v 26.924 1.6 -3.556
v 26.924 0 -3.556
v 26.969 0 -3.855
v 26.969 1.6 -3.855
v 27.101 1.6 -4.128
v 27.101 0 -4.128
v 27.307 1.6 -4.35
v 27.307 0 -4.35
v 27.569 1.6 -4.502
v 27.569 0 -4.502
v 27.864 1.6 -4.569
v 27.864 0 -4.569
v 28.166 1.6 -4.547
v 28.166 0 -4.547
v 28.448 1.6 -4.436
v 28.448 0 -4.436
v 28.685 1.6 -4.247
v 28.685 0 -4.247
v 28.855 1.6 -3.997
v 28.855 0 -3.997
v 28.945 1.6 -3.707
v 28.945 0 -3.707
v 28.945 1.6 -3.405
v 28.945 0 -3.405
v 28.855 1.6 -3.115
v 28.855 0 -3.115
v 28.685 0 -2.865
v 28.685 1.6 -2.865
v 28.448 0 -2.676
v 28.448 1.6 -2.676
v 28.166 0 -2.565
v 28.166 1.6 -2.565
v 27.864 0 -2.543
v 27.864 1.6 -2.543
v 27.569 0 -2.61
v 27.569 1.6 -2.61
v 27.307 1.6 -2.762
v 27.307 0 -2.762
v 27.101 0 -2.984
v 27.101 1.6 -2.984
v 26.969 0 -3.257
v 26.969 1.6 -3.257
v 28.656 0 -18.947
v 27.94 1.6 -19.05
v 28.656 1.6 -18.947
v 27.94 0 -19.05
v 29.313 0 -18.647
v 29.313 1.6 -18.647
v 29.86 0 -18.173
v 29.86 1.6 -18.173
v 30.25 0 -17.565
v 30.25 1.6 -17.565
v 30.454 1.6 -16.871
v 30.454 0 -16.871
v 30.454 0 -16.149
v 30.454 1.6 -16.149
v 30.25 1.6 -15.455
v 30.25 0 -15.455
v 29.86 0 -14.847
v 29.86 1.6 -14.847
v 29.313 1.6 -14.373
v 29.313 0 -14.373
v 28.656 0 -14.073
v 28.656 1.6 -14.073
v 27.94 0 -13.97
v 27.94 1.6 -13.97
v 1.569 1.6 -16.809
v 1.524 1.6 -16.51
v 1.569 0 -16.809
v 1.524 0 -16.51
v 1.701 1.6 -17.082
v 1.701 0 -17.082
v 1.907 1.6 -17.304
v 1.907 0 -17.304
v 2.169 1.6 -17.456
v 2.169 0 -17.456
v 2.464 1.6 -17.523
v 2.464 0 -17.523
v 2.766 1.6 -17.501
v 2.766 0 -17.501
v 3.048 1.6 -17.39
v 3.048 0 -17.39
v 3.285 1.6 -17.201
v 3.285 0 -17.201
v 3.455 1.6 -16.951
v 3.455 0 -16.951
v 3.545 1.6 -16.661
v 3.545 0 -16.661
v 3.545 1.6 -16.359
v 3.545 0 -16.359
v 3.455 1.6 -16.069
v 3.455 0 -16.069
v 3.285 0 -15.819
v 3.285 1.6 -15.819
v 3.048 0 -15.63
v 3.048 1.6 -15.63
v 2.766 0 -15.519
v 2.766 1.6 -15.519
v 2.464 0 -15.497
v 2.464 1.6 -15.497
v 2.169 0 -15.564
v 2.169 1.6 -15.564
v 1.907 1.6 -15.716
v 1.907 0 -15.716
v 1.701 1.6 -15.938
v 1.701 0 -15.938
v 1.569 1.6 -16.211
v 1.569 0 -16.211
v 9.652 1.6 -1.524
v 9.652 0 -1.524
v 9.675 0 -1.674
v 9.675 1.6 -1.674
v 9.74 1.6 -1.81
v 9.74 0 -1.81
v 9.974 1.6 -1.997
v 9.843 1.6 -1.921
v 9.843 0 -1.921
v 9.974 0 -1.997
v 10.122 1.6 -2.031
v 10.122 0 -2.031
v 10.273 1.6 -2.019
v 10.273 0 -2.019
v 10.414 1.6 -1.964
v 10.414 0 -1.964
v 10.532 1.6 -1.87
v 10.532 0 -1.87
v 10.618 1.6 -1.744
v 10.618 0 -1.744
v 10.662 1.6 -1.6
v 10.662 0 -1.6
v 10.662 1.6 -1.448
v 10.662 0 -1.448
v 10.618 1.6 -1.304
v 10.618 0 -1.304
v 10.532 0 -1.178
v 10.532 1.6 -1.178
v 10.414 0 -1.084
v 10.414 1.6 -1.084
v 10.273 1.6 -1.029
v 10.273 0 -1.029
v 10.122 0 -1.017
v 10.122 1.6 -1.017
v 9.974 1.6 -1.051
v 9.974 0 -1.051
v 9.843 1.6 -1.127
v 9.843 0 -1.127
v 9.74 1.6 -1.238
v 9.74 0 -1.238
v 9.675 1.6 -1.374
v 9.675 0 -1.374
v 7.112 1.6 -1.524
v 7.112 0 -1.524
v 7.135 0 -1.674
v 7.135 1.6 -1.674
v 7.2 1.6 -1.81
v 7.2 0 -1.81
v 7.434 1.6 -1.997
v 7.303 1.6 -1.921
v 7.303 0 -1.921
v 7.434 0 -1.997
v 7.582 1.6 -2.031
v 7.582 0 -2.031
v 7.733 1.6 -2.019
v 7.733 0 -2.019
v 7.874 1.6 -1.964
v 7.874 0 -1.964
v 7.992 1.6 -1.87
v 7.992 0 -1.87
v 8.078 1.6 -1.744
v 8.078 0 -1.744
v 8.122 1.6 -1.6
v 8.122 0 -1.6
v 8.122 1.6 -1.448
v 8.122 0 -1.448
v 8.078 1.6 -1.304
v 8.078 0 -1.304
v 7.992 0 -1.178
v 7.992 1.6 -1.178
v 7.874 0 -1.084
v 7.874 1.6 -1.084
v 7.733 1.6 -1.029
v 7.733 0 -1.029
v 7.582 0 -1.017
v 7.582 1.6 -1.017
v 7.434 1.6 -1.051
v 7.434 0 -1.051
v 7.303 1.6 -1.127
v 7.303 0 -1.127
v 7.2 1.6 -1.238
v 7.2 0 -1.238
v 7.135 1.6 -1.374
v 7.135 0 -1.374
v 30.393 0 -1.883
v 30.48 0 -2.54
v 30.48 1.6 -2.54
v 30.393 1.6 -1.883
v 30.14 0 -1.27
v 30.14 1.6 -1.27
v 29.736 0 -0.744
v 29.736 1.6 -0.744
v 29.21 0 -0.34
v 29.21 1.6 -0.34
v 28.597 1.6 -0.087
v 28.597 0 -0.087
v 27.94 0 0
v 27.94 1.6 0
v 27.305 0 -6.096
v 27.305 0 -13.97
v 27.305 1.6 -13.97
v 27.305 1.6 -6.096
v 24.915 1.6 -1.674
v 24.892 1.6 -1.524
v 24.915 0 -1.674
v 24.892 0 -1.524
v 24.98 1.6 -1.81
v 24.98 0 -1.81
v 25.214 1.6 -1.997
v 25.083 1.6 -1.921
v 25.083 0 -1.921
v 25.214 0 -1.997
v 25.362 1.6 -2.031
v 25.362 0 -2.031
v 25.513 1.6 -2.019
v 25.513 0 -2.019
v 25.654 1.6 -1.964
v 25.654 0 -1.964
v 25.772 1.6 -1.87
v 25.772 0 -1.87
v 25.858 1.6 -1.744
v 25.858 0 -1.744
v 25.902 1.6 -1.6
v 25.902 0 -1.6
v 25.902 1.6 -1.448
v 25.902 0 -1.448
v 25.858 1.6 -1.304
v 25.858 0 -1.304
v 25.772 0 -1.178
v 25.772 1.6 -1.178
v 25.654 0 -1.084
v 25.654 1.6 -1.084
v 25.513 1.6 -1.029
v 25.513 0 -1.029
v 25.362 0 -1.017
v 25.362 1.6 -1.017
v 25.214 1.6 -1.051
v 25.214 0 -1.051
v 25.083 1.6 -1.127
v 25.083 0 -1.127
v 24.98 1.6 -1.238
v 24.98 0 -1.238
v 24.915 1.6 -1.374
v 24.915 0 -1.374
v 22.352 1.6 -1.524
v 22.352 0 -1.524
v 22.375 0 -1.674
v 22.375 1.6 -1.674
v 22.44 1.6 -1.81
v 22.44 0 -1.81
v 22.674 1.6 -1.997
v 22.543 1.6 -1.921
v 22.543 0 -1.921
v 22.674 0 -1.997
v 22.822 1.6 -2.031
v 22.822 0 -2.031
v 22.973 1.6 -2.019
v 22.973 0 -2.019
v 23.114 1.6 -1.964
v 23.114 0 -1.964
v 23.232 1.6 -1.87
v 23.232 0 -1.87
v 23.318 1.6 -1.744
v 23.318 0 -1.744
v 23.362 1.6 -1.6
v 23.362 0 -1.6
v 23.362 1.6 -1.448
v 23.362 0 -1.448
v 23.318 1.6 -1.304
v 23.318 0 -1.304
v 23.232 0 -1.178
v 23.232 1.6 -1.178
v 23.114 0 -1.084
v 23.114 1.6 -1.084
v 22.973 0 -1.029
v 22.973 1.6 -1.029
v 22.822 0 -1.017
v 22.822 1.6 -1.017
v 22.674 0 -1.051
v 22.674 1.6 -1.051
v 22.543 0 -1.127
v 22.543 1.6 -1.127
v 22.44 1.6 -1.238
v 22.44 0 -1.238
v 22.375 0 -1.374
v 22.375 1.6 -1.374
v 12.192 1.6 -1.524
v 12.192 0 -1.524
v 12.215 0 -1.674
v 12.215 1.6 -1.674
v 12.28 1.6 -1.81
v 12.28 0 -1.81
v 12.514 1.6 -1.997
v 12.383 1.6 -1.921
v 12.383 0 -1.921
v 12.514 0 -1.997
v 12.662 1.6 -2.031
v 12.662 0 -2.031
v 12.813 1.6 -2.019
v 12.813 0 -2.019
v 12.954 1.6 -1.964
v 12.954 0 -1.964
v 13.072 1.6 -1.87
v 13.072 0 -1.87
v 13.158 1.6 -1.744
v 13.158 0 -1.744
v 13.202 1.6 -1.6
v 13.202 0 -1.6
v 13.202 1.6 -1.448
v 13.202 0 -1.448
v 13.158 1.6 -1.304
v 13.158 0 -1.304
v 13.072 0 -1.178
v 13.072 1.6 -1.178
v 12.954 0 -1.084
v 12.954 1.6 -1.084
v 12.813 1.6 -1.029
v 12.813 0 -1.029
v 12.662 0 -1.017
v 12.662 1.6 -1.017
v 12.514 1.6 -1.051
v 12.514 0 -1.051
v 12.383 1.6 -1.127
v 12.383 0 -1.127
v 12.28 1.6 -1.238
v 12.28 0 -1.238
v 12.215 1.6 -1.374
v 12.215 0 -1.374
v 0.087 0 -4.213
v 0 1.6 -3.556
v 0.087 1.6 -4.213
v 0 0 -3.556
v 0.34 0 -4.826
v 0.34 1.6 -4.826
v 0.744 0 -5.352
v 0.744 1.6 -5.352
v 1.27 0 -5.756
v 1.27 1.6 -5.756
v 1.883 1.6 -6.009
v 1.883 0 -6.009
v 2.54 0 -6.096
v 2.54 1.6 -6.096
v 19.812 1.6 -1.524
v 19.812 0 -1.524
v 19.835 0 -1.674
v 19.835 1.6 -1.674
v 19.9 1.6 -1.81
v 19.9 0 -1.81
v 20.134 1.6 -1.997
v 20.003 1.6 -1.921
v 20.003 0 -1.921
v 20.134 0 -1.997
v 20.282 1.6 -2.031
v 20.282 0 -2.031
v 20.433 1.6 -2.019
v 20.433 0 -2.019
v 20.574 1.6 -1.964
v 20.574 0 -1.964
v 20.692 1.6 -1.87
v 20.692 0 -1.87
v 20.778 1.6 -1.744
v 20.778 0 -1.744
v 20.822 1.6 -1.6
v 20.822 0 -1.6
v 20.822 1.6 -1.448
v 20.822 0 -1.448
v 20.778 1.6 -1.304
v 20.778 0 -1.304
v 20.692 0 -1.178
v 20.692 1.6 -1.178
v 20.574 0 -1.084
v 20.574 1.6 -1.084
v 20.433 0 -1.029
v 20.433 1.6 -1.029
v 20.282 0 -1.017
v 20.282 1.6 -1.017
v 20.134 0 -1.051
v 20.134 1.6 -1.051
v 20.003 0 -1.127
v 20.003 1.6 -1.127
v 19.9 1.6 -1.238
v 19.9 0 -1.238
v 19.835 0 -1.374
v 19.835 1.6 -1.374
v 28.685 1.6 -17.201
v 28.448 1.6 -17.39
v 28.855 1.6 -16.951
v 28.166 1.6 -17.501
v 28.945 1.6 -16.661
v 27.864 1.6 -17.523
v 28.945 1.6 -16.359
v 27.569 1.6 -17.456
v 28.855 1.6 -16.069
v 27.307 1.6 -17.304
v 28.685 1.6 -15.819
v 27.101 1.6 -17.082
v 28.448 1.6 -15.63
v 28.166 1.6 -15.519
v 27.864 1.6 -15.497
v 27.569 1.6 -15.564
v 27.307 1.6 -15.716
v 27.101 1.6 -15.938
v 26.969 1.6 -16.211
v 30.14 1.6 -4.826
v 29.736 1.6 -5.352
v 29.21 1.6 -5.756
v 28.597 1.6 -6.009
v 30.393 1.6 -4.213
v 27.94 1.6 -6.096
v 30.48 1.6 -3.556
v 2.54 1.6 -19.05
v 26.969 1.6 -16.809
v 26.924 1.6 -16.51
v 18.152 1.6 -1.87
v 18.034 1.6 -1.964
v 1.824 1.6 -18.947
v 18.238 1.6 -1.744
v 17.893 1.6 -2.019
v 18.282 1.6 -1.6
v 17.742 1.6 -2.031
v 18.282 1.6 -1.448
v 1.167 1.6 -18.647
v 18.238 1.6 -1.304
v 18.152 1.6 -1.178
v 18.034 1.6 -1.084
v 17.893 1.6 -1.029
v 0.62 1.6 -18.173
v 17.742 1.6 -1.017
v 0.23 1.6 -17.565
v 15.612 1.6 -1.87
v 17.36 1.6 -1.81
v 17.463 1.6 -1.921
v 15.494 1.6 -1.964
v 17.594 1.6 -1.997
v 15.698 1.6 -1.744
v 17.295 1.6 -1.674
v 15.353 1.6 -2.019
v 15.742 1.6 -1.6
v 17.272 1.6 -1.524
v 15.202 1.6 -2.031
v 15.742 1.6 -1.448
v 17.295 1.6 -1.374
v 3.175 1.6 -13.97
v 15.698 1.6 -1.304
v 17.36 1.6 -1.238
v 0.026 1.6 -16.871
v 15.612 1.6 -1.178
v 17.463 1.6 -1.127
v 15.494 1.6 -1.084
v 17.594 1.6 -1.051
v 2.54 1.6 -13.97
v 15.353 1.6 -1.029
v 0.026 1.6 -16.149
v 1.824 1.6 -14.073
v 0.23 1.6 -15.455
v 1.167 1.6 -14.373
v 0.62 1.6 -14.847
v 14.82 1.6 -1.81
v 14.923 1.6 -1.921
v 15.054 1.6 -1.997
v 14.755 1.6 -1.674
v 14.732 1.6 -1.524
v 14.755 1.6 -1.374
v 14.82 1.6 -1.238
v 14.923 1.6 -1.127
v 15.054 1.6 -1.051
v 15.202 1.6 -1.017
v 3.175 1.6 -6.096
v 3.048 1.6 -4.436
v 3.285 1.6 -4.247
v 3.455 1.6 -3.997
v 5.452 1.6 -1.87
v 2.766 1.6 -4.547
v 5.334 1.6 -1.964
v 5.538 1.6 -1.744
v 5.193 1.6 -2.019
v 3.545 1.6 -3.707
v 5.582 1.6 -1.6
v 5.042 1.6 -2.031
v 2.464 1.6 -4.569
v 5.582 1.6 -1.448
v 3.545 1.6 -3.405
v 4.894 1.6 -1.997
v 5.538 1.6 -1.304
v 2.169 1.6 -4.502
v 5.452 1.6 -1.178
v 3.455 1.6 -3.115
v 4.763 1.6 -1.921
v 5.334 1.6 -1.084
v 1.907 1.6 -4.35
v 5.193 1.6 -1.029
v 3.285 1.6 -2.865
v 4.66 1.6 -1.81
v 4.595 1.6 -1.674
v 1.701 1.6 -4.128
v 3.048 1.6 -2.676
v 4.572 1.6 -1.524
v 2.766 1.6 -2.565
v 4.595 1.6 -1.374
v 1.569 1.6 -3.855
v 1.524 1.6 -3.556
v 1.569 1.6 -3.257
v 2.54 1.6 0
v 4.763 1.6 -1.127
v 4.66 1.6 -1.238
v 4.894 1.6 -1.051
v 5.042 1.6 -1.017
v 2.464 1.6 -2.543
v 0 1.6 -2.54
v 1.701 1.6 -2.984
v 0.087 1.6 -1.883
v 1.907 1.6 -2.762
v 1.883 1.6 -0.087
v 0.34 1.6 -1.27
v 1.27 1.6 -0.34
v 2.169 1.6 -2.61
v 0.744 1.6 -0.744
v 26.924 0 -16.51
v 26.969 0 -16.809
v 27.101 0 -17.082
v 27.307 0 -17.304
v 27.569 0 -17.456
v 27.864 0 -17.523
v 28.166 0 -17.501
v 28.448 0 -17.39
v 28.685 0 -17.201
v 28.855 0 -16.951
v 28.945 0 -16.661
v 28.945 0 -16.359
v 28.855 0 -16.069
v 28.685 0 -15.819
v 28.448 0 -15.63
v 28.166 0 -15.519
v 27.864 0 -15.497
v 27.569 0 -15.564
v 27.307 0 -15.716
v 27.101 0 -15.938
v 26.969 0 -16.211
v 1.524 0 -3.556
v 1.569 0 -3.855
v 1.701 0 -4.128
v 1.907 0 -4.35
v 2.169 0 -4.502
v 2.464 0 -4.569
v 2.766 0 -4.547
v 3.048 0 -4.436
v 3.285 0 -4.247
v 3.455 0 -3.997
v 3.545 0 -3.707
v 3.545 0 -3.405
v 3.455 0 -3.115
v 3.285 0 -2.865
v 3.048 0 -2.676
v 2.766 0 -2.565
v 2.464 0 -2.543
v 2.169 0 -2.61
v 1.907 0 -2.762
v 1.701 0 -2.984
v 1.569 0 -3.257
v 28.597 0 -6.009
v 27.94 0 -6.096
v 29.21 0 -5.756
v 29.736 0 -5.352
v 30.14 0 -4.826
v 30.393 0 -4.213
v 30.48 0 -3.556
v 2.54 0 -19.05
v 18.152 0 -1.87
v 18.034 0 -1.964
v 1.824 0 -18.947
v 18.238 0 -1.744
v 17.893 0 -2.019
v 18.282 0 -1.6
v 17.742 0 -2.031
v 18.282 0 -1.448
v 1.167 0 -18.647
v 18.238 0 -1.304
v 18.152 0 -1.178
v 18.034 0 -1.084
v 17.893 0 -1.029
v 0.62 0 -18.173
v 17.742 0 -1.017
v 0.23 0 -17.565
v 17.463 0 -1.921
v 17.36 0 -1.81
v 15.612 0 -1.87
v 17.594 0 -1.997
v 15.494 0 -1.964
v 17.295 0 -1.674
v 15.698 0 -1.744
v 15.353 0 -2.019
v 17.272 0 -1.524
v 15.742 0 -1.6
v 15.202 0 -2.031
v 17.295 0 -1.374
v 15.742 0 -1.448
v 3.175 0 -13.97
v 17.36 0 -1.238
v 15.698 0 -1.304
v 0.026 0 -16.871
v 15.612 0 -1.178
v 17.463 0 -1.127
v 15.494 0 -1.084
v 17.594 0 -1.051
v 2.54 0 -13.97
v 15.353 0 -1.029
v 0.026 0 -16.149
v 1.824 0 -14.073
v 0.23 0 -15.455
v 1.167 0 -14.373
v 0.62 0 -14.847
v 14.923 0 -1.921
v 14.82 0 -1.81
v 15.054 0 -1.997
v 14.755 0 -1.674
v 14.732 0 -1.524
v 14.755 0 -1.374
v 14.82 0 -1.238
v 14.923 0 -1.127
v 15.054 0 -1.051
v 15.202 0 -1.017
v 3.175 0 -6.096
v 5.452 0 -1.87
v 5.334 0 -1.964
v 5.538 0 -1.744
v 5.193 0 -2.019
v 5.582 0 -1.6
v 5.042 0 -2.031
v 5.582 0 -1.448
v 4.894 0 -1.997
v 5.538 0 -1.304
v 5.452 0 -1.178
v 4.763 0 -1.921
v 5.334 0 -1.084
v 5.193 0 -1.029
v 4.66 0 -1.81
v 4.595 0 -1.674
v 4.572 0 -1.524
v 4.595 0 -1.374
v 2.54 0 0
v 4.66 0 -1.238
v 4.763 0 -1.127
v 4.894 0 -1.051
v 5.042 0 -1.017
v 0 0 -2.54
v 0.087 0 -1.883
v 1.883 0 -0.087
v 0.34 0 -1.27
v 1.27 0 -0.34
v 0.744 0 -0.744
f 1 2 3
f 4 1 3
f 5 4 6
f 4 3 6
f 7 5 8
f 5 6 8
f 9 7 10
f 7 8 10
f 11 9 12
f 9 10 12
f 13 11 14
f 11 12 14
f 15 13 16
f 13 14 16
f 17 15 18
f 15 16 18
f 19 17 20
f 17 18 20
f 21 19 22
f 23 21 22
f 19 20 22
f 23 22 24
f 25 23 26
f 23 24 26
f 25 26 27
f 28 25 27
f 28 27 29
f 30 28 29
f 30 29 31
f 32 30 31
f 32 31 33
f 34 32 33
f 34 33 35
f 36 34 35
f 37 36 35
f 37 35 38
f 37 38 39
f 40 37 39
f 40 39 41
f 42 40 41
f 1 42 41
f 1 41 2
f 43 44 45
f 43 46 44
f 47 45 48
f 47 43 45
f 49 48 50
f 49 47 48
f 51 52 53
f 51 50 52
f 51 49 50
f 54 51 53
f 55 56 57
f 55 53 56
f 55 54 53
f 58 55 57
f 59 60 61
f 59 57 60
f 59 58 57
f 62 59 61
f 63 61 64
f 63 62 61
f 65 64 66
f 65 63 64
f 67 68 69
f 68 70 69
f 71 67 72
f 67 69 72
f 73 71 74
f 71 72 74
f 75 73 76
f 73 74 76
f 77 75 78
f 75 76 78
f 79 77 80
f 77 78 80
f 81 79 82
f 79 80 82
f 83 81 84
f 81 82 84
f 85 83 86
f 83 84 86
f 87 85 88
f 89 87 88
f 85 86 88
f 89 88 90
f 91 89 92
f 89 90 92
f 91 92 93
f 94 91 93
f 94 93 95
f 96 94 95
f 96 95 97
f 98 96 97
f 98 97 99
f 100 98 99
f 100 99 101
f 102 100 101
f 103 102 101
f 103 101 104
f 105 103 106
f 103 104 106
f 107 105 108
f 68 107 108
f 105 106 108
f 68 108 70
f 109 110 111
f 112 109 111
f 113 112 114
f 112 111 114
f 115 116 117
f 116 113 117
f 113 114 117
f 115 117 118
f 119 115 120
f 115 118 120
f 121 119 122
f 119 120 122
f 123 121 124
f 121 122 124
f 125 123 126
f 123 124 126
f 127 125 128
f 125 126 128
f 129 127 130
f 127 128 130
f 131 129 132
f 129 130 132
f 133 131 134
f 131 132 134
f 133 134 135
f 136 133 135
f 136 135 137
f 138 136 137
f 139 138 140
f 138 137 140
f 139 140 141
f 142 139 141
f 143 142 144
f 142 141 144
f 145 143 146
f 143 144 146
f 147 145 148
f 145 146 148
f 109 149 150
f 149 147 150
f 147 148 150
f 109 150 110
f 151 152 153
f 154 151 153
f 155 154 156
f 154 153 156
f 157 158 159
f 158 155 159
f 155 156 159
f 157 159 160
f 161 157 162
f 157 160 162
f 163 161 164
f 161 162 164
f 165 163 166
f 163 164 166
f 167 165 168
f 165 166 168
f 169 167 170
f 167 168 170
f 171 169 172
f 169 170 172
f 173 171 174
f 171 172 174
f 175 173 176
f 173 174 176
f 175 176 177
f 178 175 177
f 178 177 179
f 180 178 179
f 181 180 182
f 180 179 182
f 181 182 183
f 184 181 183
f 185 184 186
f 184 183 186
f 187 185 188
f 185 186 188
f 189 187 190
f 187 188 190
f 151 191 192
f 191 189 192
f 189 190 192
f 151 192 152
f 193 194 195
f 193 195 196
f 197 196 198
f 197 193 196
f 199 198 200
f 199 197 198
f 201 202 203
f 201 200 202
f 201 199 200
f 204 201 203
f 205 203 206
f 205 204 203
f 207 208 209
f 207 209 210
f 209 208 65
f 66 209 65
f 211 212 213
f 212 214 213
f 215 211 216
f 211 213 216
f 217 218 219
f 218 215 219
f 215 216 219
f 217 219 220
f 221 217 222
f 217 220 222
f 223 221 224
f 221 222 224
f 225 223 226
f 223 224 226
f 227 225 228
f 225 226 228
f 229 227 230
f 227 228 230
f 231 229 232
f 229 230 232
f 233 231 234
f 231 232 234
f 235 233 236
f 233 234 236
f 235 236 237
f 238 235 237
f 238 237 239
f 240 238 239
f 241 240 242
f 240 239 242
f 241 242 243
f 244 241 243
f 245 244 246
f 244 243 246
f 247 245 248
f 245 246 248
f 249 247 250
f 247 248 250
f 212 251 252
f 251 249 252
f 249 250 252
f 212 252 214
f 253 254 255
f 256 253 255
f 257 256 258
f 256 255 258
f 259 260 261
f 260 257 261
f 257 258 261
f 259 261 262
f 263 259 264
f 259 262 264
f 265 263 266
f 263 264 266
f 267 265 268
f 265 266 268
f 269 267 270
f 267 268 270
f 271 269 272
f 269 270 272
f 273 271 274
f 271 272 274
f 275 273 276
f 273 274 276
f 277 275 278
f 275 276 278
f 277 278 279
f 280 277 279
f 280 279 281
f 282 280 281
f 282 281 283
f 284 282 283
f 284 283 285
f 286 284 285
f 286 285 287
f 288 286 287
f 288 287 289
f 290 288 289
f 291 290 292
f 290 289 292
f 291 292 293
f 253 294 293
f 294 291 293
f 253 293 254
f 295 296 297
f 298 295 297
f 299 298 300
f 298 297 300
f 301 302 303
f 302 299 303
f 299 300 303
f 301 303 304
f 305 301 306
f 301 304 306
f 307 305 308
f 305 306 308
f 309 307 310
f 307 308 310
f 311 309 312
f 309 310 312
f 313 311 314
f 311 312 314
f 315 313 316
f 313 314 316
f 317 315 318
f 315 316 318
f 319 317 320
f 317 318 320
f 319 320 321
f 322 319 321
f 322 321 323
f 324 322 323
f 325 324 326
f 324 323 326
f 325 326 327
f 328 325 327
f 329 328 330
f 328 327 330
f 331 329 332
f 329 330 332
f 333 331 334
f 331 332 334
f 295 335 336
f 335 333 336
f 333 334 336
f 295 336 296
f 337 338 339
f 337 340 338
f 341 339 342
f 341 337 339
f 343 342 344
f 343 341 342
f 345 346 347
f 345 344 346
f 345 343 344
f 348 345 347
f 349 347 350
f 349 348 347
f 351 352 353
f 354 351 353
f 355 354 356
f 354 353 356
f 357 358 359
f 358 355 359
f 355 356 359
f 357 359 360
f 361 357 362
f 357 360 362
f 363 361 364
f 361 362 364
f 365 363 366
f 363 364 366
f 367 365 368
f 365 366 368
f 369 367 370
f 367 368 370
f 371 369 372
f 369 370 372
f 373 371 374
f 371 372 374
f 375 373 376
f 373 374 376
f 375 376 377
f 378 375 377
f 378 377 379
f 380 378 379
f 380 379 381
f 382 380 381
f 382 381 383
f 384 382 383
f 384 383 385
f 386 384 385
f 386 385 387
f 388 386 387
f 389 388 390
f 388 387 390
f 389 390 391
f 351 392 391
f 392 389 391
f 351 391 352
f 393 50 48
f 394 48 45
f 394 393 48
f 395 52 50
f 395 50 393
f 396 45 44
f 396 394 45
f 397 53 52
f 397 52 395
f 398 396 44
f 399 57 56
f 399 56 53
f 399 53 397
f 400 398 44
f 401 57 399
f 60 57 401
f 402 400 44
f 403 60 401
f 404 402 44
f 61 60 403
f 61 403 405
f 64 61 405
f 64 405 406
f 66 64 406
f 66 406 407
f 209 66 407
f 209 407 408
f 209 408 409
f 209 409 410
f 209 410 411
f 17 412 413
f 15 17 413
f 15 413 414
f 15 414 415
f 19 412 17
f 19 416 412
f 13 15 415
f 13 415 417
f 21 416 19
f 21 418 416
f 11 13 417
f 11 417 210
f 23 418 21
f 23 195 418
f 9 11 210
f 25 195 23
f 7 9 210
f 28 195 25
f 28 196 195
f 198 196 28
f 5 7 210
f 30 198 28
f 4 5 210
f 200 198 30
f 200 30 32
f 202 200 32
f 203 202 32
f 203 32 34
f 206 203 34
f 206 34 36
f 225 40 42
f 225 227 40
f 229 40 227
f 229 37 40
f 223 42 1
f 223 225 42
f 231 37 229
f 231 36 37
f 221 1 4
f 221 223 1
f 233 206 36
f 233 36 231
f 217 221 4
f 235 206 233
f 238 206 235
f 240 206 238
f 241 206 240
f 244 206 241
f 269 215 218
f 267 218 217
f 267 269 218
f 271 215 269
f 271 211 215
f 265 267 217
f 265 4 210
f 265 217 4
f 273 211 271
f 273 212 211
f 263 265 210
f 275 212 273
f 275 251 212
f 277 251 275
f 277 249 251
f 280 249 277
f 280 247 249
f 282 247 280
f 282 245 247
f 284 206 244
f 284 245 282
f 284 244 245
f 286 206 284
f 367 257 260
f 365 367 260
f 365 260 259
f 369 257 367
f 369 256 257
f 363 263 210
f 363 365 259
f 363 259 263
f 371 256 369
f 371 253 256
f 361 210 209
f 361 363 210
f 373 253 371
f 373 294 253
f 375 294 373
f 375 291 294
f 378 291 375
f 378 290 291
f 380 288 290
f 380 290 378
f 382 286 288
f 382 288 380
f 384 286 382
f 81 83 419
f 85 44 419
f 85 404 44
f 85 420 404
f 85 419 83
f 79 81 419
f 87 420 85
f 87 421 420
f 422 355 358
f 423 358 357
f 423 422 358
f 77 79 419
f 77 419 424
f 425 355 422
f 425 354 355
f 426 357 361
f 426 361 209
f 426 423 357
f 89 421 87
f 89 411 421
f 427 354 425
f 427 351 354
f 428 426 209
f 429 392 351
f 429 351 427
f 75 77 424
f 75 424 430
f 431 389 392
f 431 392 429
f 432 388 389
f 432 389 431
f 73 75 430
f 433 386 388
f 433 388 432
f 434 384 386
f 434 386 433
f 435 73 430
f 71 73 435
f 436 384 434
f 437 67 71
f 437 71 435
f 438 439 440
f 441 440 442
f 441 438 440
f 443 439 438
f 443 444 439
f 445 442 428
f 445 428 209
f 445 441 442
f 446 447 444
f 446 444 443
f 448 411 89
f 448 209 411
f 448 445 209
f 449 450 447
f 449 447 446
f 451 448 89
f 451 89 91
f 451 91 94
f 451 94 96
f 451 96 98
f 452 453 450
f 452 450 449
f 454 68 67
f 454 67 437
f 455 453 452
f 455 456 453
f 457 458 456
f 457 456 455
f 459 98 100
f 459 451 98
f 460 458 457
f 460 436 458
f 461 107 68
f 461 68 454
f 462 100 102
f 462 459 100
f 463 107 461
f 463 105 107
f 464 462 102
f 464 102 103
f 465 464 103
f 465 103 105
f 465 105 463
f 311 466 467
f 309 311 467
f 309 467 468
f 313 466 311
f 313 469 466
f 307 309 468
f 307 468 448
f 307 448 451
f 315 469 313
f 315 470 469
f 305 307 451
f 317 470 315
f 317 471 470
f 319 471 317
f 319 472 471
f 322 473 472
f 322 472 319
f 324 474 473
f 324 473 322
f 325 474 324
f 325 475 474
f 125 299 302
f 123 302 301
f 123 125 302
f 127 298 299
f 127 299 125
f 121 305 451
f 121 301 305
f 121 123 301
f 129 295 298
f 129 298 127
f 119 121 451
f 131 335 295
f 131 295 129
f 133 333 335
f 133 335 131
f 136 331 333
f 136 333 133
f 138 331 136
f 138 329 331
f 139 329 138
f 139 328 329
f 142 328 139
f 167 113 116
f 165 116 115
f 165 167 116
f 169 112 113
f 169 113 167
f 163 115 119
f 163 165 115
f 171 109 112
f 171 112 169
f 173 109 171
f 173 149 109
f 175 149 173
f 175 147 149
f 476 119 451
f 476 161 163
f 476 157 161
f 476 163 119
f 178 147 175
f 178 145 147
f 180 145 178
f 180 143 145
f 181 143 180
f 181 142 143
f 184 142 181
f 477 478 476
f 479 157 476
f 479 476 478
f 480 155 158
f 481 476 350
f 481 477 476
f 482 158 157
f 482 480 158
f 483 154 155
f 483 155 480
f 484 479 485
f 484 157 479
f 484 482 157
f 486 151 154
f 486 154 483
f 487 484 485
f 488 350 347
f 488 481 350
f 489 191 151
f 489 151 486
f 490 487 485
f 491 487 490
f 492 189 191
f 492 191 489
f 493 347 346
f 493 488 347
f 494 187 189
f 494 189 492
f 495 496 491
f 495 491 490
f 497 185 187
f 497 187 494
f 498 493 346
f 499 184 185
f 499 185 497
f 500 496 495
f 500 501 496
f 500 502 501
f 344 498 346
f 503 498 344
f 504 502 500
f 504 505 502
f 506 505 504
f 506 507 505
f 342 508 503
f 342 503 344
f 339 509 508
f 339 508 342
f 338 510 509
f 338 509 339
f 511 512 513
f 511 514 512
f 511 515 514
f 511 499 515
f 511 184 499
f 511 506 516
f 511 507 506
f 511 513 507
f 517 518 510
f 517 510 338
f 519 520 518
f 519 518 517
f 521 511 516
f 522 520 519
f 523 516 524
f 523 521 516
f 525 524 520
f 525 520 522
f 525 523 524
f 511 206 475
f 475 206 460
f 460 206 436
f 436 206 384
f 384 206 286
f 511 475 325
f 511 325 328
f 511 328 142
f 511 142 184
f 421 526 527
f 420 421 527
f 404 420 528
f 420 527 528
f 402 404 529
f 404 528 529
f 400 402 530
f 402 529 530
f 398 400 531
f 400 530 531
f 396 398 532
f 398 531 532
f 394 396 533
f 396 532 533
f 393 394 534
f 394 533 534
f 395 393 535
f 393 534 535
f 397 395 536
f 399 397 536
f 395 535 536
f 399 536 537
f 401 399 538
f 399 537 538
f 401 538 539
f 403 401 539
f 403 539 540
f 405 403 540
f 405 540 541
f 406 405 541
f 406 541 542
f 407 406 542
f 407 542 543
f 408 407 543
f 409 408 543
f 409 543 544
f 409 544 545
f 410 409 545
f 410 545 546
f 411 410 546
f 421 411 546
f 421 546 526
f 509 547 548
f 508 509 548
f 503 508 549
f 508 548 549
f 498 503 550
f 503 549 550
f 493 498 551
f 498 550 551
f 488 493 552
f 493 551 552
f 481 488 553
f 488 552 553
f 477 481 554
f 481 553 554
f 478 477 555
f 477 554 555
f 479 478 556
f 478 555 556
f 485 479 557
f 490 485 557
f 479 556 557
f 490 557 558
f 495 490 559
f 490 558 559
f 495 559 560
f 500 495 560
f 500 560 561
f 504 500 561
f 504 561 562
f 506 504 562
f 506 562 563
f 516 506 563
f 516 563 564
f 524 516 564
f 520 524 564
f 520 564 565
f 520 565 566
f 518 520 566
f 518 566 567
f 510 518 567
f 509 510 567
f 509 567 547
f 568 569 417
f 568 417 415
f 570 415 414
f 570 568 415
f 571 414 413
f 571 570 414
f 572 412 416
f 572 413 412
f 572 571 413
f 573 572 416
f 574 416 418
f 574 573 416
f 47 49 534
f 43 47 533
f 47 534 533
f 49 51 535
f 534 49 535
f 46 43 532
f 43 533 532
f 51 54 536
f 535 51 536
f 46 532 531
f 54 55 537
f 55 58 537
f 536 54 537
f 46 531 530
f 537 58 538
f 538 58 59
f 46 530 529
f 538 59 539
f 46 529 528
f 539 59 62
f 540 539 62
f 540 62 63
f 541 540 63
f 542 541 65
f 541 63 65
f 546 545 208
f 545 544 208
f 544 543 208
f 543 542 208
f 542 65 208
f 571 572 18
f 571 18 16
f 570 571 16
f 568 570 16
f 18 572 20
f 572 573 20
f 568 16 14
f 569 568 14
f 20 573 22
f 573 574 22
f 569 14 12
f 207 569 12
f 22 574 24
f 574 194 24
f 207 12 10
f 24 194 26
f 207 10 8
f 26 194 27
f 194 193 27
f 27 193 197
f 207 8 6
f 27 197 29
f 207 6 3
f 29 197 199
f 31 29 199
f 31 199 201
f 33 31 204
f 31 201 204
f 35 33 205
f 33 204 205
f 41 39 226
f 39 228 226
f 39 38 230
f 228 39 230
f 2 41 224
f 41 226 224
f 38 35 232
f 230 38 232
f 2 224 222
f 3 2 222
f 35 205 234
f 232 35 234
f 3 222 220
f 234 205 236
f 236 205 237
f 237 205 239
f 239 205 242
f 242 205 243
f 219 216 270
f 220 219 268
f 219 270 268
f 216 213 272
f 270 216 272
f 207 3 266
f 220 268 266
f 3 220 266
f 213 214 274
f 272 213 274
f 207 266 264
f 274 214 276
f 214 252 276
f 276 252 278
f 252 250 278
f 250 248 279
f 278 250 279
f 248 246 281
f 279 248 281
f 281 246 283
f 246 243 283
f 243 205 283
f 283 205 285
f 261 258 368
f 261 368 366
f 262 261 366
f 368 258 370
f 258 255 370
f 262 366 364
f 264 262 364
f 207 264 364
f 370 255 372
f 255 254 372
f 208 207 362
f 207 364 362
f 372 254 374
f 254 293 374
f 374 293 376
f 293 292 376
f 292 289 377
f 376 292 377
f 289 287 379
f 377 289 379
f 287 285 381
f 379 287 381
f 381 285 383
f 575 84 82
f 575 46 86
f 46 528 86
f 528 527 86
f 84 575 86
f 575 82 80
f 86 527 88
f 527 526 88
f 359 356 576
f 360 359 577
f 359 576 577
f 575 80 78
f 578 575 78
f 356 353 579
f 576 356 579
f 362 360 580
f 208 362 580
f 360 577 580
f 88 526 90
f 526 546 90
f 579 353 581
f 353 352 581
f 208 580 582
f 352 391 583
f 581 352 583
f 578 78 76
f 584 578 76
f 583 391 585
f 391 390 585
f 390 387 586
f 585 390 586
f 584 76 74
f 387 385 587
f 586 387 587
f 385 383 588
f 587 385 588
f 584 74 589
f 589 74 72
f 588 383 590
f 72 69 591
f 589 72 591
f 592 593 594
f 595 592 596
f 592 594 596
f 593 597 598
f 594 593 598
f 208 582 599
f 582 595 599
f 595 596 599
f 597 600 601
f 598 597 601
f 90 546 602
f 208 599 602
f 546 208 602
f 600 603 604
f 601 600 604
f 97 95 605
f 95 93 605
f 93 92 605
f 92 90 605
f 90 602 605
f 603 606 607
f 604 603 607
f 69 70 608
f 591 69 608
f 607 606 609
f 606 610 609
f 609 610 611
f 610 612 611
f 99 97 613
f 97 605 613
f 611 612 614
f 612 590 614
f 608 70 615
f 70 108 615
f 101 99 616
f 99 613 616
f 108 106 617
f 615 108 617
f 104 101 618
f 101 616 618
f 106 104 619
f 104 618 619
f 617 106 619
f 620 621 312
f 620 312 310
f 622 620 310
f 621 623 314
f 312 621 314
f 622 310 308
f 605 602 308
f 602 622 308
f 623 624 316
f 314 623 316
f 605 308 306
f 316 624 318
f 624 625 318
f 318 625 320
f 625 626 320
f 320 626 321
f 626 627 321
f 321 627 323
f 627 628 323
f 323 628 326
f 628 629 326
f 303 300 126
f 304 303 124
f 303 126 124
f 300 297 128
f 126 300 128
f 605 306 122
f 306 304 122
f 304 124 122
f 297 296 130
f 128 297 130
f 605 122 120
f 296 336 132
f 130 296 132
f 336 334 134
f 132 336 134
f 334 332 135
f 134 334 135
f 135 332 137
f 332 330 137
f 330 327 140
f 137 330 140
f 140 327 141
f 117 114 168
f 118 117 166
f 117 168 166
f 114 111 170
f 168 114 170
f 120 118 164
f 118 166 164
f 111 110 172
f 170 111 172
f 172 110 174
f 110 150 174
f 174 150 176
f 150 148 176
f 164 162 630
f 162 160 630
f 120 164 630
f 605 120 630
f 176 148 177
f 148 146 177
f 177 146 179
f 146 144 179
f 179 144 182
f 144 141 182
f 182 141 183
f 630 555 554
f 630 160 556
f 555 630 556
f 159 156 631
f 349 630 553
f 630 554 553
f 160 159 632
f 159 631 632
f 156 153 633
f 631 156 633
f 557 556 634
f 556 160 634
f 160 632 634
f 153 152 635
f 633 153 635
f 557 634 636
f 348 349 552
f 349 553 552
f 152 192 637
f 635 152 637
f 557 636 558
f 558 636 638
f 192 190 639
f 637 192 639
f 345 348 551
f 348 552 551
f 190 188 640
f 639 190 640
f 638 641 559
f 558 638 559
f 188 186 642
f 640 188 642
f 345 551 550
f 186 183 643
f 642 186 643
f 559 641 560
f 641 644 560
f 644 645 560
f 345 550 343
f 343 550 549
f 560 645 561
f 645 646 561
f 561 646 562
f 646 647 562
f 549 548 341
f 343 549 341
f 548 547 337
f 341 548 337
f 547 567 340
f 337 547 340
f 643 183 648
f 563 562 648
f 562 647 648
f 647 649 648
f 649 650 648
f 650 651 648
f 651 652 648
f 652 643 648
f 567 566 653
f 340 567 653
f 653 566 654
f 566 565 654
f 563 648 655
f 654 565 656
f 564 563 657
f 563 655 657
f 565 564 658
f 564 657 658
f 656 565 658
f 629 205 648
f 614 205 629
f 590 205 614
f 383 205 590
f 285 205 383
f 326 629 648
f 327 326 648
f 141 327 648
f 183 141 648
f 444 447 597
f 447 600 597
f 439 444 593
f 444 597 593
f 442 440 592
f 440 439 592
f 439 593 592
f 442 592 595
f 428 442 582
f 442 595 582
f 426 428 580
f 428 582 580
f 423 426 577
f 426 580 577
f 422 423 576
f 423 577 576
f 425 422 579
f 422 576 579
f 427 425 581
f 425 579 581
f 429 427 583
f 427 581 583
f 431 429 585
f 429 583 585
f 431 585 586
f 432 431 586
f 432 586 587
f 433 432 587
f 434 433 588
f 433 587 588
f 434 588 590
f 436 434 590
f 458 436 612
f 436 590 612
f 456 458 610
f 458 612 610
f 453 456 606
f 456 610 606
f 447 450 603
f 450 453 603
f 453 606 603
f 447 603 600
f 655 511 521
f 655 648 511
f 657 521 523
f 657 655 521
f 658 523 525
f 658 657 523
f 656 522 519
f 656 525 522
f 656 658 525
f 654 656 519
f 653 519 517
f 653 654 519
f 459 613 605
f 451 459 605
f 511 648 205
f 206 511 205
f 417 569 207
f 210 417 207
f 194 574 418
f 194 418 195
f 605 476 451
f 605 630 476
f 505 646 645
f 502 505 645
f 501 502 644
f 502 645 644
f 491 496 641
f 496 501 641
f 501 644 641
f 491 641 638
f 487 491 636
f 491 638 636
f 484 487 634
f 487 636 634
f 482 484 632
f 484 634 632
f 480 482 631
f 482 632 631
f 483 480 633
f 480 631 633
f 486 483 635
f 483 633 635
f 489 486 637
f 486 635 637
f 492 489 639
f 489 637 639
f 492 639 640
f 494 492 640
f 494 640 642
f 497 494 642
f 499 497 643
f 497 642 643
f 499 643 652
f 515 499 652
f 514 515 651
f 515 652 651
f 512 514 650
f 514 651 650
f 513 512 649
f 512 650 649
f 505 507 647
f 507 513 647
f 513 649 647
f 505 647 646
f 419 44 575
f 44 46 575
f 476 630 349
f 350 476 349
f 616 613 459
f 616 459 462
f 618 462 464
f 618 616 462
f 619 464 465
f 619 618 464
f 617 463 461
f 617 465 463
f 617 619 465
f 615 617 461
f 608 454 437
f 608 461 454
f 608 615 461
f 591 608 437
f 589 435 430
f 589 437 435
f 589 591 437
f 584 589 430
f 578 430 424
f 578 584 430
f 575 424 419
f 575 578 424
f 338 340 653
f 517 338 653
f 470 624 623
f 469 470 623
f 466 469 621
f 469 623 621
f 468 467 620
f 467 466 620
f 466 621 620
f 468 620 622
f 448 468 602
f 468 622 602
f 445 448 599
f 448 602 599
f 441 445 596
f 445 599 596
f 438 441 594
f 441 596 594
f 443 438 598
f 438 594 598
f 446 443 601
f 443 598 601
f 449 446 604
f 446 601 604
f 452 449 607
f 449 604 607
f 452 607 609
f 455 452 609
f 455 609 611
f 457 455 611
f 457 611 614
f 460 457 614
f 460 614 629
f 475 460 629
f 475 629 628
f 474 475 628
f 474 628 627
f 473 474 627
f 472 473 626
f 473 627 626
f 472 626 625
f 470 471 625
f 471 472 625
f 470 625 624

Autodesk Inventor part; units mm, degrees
ref_plane "YZ Plane" through (0, 0, 0) normal (1, 0, 0) x (0, 1, 0)
ref_plane "XZ Plane" through (0, 0, 0) normal (0, 1, 0) x (-1, 0, 0)
ref_plane "XY Plane" through (0, 0, 0) normal (0, 0, 1) x (1, 0, 0)
sketch "Sketch1" plane through (0, 0, 0) normal (0, 1, 0) x (-1, 0, 0)
  line L0 (-2.54, 0) -> (-27.94, 0)
  line L1 (-30.48, -16.51) -> (-30.48, -16.51)
  line L2 (-27.94, -19.05) -> (-2.54, -19.05)
  line L3 (0, -16.51) -> (0, -16.51)
  circle A0 centre (-2.54, -16.51) radius 1.016
  circle A1 centre (-27.94, -16.51) radius 1.016
  circle A2 centre (-2.54, -3.556) radius 1.016
  circle A3 centre (-27.94, -3.556) radius 1.016
  line L4 (-3.175, -19.05) -> (-27.305, -19.05)
  line L5 (-27.305, -19.05) -> (-27.305, 0)
  line L6 (-27.305, 0) -> (-3.175, 0)
  line L7 (-3.175, 0) -> (-3.175, -19.05)
  line L8 (-2.54, -13.97) -> (-27.94, -13.97)
  line L9 (-30.48, -13.97) -> (-30.48, -6.096)
  line L10 (-27.94, -6.096) -> (-2.54, -6.096)
  line L11 (0, -6.096) -> (0, -13.97)
  arc A4 (-2.54, -19.05) -> (0, -16.51) centre (-2.54, -16.51) ccw
  arc A5 (-30.48, -16.51) -> (-27.94, -19.05) centre (-27.94, -16.51) ccw
  arc A6 (0, -16.51) -> (-2.54, -13.97) centre (-2.54, -16.51) ccw
  arc A7 (-27.94, -13.97) -> (-30.48, -16.51) centre (-27.94, -16.51) ccw
  line L12 (0, -3.556) -> (0, -2.54)
  line L13 (-30.48, -3.556) -> (-30.48, -2.54)
  arc A8 (-30.48, -3.556) -> (-27.94, -6.096) centre (-27.94, -3.556) ccw
  arc A9 (-27.94, 0) -> (-30.48, -2.54) centre (-27.94, -2.54) ccw
  arc A10 (0, -2.54) -> (-2.54, 0) centre (-2.54, -2.54) ccw
  arc A11 (-2.54, -6.096) -> (0, -3.556) centre (-2.54, -3.556) ccw
  line L14 (-0.2121, -1.524) -> (-30.2679, -1.524) construction
  circle A12 centre (-5.08, -1.524) radius 0.508
  circle A13 centre (-7.62, -1.524) radius 0.508
  circle A14 centre (-10.16, -1.524) radius 0.508
  circle A15 centre (-12.7, -1.524) radius 0.508
  circle A16 centre (-15.24, -1.524) radius 0.508
  circle A17 centre (-17.78, -1.524) radius 0.508
  circle A18 centre (-20.32, -1.524) radius 0.508
  circle A19 centre (-22.86, -1.524) radius 0.508
  circle A20 centre (-25.4, -1.524) radius 0.508
  point P0 (0, 0)
  point P1 (-30.48, -19.05)
  point P2 (-30.48, 0)
  point P3 (0, -19.05)
  point P4 (-3.175, -13.97)
  point P5 (-3.175, -6.096)
  point P6 (-27.305, -6.096)
  point P7 (-27.305, -13.97)
  dimension "d0" = 30.48
  dimension "d1" = 19.05
  dimension "d2" = 3.556
  dimension "d3" = 3.556
  dimension "d4" = 2.54
  dimension "d5" = 2.54
  dimension "d6" = 2.54
  dimension "d7" = 2.54
  dimension "d8" = 12.954
  dimension "d9" = 12.954
  dimension "d10" = 2.032
  dimension "d11" = 24.13
  dimension "d12" = 3.175
  dimension "d13" = 3.175
  dimension "d14" = 2.54
  dimension "d15" = 2.54
  dimension "d16" = 2.54
  dimension "d17" = 2.54
  dimension "d18" = 1.524
  dimension "d19" = 5.08
  dimension "d22" = 2.54
  dimension "d27" = 5.08
  dimension "d28" = 1.016
  dimension "d31" = 2.54
extrude "Extrusion1" add sketch "Sketch1" along normal blind 1.6 contours A10 L12 A11 L10 L7 A2 L0 | L7 A2 L10 L5 A3 L0 | L5 A3 L10 A8 L13 A9 L0 | L7 L8 L5 L10 | L8 A6 A4 L2 L7 A0 | L7 A0 L2 L5 A1 L8 | L5 A1 L2 A5 A7 L8
equation "\"d3\" = d2"
equation "\"d9\" = d8"
equation "\"d12\" = d13"
equation "\"d19\" = d27"
properties part number "L3GD20H footprint"
